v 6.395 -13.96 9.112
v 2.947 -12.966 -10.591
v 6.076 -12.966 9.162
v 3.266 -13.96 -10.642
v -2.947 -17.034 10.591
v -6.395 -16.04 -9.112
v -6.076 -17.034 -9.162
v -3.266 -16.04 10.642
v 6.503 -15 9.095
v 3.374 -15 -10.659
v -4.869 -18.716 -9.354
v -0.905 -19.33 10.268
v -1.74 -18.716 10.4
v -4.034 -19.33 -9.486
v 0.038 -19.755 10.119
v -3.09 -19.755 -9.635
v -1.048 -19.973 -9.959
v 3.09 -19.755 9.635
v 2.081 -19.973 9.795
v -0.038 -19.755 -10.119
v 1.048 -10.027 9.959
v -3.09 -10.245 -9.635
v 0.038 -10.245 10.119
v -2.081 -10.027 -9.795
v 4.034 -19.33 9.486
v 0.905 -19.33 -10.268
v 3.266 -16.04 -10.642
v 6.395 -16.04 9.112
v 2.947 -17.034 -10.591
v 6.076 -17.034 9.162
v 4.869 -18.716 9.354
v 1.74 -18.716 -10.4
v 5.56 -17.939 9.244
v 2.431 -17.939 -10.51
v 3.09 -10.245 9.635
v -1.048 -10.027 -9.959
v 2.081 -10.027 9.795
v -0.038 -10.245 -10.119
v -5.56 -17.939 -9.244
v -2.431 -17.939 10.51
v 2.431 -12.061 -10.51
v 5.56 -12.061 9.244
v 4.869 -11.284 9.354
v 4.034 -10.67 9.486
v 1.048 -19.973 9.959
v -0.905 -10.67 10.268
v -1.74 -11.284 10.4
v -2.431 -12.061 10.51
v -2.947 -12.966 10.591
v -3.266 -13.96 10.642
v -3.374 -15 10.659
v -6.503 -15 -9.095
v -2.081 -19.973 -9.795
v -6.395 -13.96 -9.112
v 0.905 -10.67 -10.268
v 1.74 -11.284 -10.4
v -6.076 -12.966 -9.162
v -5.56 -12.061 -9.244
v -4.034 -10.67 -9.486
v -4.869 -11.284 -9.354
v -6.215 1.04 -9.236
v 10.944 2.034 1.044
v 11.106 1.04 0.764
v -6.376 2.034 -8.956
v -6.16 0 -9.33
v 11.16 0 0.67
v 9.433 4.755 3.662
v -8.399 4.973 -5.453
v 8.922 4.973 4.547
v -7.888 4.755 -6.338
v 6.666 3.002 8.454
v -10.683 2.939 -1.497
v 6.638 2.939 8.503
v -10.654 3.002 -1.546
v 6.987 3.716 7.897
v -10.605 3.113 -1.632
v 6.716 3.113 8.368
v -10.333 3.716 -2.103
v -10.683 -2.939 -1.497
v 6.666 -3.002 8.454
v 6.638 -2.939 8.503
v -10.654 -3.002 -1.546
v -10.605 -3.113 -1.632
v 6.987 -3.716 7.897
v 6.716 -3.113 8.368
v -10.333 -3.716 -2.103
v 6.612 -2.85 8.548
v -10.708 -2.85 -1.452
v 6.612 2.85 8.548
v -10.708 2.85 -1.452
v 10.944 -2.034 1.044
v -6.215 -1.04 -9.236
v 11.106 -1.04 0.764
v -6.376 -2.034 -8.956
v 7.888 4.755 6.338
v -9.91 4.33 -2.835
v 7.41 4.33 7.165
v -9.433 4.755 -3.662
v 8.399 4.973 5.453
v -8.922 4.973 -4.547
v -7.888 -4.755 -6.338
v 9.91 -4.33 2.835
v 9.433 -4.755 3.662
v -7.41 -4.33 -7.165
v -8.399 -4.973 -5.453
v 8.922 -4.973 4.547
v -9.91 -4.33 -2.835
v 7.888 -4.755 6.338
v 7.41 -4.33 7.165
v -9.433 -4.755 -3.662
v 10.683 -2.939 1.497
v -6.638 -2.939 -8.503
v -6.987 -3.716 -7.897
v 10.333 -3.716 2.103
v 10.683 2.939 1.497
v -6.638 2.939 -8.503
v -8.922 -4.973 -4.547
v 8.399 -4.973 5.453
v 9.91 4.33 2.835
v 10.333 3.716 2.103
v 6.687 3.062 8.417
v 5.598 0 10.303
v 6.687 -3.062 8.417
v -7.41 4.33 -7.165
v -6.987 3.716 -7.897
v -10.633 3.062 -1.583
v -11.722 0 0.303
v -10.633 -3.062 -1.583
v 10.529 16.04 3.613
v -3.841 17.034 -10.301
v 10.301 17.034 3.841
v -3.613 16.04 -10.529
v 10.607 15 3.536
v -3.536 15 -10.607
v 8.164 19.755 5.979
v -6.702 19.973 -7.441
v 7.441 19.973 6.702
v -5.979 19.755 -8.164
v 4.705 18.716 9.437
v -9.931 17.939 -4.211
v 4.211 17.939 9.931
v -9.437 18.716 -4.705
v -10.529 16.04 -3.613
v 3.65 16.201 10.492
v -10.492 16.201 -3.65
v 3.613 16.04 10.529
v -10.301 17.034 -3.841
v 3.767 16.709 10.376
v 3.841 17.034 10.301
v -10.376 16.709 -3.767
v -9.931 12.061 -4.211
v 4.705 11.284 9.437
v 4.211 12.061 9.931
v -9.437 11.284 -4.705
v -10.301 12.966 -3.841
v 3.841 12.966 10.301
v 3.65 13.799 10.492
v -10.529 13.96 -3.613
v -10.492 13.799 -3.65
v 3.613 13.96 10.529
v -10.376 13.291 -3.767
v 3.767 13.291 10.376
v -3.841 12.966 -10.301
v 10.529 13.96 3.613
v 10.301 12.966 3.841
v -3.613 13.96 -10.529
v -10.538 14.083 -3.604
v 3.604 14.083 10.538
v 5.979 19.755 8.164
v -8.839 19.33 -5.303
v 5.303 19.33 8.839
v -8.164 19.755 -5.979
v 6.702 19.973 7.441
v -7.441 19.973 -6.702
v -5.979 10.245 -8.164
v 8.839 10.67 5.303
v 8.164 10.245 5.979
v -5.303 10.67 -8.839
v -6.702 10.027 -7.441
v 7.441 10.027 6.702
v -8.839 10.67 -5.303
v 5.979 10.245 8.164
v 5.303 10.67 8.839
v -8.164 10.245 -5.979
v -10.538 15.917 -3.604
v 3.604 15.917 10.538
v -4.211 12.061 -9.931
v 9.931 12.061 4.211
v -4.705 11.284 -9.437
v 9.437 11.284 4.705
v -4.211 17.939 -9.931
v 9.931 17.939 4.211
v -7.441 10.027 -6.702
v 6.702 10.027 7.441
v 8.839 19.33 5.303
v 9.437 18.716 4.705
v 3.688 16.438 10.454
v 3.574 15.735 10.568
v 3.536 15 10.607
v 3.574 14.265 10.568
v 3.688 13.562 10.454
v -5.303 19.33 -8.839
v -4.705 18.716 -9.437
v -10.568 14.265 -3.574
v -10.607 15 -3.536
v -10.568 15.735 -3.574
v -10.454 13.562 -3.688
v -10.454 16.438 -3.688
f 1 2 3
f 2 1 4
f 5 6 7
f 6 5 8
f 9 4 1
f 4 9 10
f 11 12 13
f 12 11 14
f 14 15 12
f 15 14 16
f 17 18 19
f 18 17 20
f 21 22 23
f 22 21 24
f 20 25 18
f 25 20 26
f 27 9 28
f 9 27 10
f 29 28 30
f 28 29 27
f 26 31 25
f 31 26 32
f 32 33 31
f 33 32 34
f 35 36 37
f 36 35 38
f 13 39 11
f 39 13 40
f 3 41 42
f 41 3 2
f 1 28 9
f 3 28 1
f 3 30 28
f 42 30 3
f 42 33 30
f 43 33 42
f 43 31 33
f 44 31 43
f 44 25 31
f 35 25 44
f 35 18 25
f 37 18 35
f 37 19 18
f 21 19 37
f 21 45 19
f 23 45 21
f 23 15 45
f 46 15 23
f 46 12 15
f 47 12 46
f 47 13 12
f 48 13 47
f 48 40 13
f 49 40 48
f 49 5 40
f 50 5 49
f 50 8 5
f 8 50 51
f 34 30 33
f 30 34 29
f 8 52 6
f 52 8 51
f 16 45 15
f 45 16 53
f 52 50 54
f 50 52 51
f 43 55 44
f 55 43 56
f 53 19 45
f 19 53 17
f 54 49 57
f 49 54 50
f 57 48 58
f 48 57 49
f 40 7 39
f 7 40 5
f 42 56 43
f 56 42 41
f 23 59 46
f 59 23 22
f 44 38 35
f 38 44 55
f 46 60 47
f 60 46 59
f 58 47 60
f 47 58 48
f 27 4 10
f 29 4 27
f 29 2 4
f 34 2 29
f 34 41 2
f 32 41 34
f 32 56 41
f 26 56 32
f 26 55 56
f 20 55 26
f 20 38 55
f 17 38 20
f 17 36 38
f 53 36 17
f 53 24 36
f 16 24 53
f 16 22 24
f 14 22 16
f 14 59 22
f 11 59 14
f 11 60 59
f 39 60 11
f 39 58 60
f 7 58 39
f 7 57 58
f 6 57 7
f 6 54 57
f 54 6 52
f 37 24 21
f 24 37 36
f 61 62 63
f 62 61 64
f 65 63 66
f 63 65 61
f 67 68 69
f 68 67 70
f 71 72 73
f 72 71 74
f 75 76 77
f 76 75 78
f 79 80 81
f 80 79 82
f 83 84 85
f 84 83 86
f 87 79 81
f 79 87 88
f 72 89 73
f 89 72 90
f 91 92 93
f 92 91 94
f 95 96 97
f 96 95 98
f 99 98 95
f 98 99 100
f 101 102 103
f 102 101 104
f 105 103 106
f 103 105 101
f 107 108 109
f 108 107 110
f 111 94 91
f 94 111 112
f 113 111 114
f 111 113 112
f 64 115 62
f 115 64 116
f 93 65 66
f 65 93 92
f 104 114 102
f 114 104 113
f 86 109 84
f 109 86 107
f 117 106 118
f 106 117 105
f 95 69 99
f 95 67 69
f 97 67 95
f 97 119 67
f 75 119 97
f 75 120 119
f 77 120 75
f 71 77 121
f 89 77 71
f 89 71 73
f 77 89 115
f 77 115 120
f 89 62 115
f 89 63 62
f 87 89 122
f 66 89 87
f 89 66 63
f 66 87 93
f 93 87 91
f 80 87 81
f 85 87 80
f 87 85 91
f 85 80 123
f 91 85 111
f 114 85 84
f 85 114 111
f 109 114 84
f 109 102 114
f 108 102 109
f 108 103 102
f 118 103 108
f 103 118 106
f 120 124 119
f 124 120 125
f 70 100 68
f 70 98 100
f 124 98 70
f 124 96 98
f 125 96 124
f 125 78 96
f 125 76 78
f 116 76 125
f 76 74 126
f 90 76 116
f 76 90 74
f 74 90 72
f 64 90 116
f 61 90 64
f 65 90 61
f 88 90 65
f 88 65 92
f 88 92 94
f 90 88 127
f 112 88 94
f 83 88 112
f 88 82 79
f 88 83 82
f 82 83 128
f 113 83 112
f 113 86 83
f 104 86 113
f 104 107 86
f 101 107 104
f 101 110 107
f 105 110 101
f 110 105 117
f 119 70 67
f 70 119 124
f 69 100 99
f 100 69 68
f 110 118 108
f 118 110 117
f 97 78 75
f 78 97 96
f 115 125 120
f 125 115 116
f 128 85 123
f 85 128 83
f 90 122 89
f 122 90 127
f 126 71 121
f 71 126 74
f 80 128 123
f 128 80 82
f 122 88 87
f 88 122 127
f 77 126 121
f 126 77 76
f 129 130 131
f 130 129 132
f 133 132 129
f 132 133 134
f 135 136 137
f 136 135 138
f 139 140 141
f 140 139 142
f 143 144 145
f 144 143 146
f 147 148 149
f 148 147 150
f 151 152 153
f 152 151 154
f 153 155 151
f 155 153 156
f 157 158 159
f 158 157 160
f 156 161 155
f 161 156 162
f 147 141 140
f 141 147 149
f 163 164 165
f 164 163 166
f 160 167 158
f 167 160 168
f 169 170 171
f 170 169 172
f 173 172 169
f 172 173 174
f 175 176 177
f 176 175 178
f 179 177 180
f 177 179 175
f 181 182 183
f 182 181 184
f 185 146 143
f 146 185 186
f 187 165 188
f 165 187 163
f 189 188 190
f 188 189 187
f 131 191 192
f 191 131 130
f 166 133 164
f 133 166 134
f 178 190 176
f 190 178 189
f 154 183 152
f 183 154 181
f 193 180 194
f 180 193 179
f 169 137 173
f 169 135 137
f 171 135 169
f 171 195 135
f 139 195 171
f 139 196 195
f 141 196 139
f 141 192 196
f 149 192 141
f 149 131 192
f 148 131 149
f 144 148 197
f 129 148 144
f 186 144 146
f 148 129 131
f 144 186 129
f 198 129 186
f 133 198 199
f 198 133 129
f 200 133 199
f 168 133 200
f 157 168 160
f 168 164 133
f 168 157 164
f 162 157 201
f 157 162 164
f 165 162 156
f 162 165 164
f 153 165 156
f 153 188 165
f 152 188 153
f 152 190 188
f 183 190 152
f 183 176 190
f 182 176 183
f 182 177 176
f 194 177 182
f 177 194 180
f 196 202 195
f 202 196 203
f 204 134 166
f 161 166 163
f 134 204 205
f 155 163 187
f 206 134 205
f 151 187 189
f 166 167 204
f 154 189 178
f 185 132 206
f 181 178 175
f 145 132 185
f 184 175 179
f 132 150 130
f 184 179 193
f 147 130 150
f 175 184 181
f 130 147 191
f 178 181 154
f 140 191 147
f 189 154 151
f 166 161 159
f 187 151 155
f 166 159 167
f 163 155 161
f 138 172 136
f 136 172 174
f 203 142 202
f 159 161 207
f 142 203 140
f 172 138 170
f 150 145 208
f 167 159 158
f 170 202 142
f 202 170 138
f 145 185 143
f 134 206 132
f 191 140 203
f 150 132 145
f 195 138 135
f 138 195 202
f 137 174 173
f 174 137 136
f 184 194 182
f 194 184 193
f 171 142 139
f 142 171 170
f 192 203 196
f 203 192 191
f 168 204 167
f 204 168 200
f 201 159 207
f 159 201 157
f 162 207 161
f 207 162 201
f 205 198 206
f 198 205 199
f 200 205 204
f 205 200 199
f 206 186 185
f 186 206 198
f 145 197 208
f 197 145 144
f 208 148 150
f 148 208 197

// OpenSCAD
/* From http://www.thingiverse.com/thing:3457
   © 2010 whosawhatsis

   This program is free software: you can redistribute it and/or modify
   it under the terms of the GNU Lesser General Public License as published by
   the Free Software Foundation, either version 3 of the License, or
   (at your option) any later version.

   This program is distributed in the hope that it will be useful,
   but WITHOUT ANY WARRANTY; without even the implied warranty of
   MERCHANTABILITY or FITNESS FOR A PARTICULAR PURPOSE. See the
   GNU Lesser General Public License for more details.

   You should have received a copy of the GNU Lesser General Public License
   along with this program. If not, see <http://www.gnu.org/licenses/>.
*/


/*
This script generates a teardrop shape at the appropriate angle to prevent overhangs greater than 45 degrees. The angle is in degrees, and is a rotation around the Y axis. You can then rotate around Z to point it in any direction. Rotation around X or Y will cause the angle to be wrong.
*/

module teardrop(radius, length, angle) {
	rotate([0, angle, 0]) union() {
		linear_extrude(height = length, center = true, convexity = radius, twist = 0)
			circle(r = radius, center = true, $fn = 30);
		linear_extrude(height = length, center = true, convexity = radius, twist = 0)
			projection(cut = false) 
				rotate([0, -angle, 0]) 
					translate([0, 0, radius * sin(45) * 1.5]) 
						cylinder(h = radius * sin(45), r1 = radius * sin(45), r2 = 0, center = true, $fn = 30);
	}
}

module test_teardrop(){
    color("red")translate([0, -15, 0]) teardrop(5, 20, 9);
    color("blue")translate([0, 0, 0]) teardrop(5, 20, 60);
    color("green")translate([0, 15, 0]) teardrop(5, 20, 45);
}

test_teardrop();
